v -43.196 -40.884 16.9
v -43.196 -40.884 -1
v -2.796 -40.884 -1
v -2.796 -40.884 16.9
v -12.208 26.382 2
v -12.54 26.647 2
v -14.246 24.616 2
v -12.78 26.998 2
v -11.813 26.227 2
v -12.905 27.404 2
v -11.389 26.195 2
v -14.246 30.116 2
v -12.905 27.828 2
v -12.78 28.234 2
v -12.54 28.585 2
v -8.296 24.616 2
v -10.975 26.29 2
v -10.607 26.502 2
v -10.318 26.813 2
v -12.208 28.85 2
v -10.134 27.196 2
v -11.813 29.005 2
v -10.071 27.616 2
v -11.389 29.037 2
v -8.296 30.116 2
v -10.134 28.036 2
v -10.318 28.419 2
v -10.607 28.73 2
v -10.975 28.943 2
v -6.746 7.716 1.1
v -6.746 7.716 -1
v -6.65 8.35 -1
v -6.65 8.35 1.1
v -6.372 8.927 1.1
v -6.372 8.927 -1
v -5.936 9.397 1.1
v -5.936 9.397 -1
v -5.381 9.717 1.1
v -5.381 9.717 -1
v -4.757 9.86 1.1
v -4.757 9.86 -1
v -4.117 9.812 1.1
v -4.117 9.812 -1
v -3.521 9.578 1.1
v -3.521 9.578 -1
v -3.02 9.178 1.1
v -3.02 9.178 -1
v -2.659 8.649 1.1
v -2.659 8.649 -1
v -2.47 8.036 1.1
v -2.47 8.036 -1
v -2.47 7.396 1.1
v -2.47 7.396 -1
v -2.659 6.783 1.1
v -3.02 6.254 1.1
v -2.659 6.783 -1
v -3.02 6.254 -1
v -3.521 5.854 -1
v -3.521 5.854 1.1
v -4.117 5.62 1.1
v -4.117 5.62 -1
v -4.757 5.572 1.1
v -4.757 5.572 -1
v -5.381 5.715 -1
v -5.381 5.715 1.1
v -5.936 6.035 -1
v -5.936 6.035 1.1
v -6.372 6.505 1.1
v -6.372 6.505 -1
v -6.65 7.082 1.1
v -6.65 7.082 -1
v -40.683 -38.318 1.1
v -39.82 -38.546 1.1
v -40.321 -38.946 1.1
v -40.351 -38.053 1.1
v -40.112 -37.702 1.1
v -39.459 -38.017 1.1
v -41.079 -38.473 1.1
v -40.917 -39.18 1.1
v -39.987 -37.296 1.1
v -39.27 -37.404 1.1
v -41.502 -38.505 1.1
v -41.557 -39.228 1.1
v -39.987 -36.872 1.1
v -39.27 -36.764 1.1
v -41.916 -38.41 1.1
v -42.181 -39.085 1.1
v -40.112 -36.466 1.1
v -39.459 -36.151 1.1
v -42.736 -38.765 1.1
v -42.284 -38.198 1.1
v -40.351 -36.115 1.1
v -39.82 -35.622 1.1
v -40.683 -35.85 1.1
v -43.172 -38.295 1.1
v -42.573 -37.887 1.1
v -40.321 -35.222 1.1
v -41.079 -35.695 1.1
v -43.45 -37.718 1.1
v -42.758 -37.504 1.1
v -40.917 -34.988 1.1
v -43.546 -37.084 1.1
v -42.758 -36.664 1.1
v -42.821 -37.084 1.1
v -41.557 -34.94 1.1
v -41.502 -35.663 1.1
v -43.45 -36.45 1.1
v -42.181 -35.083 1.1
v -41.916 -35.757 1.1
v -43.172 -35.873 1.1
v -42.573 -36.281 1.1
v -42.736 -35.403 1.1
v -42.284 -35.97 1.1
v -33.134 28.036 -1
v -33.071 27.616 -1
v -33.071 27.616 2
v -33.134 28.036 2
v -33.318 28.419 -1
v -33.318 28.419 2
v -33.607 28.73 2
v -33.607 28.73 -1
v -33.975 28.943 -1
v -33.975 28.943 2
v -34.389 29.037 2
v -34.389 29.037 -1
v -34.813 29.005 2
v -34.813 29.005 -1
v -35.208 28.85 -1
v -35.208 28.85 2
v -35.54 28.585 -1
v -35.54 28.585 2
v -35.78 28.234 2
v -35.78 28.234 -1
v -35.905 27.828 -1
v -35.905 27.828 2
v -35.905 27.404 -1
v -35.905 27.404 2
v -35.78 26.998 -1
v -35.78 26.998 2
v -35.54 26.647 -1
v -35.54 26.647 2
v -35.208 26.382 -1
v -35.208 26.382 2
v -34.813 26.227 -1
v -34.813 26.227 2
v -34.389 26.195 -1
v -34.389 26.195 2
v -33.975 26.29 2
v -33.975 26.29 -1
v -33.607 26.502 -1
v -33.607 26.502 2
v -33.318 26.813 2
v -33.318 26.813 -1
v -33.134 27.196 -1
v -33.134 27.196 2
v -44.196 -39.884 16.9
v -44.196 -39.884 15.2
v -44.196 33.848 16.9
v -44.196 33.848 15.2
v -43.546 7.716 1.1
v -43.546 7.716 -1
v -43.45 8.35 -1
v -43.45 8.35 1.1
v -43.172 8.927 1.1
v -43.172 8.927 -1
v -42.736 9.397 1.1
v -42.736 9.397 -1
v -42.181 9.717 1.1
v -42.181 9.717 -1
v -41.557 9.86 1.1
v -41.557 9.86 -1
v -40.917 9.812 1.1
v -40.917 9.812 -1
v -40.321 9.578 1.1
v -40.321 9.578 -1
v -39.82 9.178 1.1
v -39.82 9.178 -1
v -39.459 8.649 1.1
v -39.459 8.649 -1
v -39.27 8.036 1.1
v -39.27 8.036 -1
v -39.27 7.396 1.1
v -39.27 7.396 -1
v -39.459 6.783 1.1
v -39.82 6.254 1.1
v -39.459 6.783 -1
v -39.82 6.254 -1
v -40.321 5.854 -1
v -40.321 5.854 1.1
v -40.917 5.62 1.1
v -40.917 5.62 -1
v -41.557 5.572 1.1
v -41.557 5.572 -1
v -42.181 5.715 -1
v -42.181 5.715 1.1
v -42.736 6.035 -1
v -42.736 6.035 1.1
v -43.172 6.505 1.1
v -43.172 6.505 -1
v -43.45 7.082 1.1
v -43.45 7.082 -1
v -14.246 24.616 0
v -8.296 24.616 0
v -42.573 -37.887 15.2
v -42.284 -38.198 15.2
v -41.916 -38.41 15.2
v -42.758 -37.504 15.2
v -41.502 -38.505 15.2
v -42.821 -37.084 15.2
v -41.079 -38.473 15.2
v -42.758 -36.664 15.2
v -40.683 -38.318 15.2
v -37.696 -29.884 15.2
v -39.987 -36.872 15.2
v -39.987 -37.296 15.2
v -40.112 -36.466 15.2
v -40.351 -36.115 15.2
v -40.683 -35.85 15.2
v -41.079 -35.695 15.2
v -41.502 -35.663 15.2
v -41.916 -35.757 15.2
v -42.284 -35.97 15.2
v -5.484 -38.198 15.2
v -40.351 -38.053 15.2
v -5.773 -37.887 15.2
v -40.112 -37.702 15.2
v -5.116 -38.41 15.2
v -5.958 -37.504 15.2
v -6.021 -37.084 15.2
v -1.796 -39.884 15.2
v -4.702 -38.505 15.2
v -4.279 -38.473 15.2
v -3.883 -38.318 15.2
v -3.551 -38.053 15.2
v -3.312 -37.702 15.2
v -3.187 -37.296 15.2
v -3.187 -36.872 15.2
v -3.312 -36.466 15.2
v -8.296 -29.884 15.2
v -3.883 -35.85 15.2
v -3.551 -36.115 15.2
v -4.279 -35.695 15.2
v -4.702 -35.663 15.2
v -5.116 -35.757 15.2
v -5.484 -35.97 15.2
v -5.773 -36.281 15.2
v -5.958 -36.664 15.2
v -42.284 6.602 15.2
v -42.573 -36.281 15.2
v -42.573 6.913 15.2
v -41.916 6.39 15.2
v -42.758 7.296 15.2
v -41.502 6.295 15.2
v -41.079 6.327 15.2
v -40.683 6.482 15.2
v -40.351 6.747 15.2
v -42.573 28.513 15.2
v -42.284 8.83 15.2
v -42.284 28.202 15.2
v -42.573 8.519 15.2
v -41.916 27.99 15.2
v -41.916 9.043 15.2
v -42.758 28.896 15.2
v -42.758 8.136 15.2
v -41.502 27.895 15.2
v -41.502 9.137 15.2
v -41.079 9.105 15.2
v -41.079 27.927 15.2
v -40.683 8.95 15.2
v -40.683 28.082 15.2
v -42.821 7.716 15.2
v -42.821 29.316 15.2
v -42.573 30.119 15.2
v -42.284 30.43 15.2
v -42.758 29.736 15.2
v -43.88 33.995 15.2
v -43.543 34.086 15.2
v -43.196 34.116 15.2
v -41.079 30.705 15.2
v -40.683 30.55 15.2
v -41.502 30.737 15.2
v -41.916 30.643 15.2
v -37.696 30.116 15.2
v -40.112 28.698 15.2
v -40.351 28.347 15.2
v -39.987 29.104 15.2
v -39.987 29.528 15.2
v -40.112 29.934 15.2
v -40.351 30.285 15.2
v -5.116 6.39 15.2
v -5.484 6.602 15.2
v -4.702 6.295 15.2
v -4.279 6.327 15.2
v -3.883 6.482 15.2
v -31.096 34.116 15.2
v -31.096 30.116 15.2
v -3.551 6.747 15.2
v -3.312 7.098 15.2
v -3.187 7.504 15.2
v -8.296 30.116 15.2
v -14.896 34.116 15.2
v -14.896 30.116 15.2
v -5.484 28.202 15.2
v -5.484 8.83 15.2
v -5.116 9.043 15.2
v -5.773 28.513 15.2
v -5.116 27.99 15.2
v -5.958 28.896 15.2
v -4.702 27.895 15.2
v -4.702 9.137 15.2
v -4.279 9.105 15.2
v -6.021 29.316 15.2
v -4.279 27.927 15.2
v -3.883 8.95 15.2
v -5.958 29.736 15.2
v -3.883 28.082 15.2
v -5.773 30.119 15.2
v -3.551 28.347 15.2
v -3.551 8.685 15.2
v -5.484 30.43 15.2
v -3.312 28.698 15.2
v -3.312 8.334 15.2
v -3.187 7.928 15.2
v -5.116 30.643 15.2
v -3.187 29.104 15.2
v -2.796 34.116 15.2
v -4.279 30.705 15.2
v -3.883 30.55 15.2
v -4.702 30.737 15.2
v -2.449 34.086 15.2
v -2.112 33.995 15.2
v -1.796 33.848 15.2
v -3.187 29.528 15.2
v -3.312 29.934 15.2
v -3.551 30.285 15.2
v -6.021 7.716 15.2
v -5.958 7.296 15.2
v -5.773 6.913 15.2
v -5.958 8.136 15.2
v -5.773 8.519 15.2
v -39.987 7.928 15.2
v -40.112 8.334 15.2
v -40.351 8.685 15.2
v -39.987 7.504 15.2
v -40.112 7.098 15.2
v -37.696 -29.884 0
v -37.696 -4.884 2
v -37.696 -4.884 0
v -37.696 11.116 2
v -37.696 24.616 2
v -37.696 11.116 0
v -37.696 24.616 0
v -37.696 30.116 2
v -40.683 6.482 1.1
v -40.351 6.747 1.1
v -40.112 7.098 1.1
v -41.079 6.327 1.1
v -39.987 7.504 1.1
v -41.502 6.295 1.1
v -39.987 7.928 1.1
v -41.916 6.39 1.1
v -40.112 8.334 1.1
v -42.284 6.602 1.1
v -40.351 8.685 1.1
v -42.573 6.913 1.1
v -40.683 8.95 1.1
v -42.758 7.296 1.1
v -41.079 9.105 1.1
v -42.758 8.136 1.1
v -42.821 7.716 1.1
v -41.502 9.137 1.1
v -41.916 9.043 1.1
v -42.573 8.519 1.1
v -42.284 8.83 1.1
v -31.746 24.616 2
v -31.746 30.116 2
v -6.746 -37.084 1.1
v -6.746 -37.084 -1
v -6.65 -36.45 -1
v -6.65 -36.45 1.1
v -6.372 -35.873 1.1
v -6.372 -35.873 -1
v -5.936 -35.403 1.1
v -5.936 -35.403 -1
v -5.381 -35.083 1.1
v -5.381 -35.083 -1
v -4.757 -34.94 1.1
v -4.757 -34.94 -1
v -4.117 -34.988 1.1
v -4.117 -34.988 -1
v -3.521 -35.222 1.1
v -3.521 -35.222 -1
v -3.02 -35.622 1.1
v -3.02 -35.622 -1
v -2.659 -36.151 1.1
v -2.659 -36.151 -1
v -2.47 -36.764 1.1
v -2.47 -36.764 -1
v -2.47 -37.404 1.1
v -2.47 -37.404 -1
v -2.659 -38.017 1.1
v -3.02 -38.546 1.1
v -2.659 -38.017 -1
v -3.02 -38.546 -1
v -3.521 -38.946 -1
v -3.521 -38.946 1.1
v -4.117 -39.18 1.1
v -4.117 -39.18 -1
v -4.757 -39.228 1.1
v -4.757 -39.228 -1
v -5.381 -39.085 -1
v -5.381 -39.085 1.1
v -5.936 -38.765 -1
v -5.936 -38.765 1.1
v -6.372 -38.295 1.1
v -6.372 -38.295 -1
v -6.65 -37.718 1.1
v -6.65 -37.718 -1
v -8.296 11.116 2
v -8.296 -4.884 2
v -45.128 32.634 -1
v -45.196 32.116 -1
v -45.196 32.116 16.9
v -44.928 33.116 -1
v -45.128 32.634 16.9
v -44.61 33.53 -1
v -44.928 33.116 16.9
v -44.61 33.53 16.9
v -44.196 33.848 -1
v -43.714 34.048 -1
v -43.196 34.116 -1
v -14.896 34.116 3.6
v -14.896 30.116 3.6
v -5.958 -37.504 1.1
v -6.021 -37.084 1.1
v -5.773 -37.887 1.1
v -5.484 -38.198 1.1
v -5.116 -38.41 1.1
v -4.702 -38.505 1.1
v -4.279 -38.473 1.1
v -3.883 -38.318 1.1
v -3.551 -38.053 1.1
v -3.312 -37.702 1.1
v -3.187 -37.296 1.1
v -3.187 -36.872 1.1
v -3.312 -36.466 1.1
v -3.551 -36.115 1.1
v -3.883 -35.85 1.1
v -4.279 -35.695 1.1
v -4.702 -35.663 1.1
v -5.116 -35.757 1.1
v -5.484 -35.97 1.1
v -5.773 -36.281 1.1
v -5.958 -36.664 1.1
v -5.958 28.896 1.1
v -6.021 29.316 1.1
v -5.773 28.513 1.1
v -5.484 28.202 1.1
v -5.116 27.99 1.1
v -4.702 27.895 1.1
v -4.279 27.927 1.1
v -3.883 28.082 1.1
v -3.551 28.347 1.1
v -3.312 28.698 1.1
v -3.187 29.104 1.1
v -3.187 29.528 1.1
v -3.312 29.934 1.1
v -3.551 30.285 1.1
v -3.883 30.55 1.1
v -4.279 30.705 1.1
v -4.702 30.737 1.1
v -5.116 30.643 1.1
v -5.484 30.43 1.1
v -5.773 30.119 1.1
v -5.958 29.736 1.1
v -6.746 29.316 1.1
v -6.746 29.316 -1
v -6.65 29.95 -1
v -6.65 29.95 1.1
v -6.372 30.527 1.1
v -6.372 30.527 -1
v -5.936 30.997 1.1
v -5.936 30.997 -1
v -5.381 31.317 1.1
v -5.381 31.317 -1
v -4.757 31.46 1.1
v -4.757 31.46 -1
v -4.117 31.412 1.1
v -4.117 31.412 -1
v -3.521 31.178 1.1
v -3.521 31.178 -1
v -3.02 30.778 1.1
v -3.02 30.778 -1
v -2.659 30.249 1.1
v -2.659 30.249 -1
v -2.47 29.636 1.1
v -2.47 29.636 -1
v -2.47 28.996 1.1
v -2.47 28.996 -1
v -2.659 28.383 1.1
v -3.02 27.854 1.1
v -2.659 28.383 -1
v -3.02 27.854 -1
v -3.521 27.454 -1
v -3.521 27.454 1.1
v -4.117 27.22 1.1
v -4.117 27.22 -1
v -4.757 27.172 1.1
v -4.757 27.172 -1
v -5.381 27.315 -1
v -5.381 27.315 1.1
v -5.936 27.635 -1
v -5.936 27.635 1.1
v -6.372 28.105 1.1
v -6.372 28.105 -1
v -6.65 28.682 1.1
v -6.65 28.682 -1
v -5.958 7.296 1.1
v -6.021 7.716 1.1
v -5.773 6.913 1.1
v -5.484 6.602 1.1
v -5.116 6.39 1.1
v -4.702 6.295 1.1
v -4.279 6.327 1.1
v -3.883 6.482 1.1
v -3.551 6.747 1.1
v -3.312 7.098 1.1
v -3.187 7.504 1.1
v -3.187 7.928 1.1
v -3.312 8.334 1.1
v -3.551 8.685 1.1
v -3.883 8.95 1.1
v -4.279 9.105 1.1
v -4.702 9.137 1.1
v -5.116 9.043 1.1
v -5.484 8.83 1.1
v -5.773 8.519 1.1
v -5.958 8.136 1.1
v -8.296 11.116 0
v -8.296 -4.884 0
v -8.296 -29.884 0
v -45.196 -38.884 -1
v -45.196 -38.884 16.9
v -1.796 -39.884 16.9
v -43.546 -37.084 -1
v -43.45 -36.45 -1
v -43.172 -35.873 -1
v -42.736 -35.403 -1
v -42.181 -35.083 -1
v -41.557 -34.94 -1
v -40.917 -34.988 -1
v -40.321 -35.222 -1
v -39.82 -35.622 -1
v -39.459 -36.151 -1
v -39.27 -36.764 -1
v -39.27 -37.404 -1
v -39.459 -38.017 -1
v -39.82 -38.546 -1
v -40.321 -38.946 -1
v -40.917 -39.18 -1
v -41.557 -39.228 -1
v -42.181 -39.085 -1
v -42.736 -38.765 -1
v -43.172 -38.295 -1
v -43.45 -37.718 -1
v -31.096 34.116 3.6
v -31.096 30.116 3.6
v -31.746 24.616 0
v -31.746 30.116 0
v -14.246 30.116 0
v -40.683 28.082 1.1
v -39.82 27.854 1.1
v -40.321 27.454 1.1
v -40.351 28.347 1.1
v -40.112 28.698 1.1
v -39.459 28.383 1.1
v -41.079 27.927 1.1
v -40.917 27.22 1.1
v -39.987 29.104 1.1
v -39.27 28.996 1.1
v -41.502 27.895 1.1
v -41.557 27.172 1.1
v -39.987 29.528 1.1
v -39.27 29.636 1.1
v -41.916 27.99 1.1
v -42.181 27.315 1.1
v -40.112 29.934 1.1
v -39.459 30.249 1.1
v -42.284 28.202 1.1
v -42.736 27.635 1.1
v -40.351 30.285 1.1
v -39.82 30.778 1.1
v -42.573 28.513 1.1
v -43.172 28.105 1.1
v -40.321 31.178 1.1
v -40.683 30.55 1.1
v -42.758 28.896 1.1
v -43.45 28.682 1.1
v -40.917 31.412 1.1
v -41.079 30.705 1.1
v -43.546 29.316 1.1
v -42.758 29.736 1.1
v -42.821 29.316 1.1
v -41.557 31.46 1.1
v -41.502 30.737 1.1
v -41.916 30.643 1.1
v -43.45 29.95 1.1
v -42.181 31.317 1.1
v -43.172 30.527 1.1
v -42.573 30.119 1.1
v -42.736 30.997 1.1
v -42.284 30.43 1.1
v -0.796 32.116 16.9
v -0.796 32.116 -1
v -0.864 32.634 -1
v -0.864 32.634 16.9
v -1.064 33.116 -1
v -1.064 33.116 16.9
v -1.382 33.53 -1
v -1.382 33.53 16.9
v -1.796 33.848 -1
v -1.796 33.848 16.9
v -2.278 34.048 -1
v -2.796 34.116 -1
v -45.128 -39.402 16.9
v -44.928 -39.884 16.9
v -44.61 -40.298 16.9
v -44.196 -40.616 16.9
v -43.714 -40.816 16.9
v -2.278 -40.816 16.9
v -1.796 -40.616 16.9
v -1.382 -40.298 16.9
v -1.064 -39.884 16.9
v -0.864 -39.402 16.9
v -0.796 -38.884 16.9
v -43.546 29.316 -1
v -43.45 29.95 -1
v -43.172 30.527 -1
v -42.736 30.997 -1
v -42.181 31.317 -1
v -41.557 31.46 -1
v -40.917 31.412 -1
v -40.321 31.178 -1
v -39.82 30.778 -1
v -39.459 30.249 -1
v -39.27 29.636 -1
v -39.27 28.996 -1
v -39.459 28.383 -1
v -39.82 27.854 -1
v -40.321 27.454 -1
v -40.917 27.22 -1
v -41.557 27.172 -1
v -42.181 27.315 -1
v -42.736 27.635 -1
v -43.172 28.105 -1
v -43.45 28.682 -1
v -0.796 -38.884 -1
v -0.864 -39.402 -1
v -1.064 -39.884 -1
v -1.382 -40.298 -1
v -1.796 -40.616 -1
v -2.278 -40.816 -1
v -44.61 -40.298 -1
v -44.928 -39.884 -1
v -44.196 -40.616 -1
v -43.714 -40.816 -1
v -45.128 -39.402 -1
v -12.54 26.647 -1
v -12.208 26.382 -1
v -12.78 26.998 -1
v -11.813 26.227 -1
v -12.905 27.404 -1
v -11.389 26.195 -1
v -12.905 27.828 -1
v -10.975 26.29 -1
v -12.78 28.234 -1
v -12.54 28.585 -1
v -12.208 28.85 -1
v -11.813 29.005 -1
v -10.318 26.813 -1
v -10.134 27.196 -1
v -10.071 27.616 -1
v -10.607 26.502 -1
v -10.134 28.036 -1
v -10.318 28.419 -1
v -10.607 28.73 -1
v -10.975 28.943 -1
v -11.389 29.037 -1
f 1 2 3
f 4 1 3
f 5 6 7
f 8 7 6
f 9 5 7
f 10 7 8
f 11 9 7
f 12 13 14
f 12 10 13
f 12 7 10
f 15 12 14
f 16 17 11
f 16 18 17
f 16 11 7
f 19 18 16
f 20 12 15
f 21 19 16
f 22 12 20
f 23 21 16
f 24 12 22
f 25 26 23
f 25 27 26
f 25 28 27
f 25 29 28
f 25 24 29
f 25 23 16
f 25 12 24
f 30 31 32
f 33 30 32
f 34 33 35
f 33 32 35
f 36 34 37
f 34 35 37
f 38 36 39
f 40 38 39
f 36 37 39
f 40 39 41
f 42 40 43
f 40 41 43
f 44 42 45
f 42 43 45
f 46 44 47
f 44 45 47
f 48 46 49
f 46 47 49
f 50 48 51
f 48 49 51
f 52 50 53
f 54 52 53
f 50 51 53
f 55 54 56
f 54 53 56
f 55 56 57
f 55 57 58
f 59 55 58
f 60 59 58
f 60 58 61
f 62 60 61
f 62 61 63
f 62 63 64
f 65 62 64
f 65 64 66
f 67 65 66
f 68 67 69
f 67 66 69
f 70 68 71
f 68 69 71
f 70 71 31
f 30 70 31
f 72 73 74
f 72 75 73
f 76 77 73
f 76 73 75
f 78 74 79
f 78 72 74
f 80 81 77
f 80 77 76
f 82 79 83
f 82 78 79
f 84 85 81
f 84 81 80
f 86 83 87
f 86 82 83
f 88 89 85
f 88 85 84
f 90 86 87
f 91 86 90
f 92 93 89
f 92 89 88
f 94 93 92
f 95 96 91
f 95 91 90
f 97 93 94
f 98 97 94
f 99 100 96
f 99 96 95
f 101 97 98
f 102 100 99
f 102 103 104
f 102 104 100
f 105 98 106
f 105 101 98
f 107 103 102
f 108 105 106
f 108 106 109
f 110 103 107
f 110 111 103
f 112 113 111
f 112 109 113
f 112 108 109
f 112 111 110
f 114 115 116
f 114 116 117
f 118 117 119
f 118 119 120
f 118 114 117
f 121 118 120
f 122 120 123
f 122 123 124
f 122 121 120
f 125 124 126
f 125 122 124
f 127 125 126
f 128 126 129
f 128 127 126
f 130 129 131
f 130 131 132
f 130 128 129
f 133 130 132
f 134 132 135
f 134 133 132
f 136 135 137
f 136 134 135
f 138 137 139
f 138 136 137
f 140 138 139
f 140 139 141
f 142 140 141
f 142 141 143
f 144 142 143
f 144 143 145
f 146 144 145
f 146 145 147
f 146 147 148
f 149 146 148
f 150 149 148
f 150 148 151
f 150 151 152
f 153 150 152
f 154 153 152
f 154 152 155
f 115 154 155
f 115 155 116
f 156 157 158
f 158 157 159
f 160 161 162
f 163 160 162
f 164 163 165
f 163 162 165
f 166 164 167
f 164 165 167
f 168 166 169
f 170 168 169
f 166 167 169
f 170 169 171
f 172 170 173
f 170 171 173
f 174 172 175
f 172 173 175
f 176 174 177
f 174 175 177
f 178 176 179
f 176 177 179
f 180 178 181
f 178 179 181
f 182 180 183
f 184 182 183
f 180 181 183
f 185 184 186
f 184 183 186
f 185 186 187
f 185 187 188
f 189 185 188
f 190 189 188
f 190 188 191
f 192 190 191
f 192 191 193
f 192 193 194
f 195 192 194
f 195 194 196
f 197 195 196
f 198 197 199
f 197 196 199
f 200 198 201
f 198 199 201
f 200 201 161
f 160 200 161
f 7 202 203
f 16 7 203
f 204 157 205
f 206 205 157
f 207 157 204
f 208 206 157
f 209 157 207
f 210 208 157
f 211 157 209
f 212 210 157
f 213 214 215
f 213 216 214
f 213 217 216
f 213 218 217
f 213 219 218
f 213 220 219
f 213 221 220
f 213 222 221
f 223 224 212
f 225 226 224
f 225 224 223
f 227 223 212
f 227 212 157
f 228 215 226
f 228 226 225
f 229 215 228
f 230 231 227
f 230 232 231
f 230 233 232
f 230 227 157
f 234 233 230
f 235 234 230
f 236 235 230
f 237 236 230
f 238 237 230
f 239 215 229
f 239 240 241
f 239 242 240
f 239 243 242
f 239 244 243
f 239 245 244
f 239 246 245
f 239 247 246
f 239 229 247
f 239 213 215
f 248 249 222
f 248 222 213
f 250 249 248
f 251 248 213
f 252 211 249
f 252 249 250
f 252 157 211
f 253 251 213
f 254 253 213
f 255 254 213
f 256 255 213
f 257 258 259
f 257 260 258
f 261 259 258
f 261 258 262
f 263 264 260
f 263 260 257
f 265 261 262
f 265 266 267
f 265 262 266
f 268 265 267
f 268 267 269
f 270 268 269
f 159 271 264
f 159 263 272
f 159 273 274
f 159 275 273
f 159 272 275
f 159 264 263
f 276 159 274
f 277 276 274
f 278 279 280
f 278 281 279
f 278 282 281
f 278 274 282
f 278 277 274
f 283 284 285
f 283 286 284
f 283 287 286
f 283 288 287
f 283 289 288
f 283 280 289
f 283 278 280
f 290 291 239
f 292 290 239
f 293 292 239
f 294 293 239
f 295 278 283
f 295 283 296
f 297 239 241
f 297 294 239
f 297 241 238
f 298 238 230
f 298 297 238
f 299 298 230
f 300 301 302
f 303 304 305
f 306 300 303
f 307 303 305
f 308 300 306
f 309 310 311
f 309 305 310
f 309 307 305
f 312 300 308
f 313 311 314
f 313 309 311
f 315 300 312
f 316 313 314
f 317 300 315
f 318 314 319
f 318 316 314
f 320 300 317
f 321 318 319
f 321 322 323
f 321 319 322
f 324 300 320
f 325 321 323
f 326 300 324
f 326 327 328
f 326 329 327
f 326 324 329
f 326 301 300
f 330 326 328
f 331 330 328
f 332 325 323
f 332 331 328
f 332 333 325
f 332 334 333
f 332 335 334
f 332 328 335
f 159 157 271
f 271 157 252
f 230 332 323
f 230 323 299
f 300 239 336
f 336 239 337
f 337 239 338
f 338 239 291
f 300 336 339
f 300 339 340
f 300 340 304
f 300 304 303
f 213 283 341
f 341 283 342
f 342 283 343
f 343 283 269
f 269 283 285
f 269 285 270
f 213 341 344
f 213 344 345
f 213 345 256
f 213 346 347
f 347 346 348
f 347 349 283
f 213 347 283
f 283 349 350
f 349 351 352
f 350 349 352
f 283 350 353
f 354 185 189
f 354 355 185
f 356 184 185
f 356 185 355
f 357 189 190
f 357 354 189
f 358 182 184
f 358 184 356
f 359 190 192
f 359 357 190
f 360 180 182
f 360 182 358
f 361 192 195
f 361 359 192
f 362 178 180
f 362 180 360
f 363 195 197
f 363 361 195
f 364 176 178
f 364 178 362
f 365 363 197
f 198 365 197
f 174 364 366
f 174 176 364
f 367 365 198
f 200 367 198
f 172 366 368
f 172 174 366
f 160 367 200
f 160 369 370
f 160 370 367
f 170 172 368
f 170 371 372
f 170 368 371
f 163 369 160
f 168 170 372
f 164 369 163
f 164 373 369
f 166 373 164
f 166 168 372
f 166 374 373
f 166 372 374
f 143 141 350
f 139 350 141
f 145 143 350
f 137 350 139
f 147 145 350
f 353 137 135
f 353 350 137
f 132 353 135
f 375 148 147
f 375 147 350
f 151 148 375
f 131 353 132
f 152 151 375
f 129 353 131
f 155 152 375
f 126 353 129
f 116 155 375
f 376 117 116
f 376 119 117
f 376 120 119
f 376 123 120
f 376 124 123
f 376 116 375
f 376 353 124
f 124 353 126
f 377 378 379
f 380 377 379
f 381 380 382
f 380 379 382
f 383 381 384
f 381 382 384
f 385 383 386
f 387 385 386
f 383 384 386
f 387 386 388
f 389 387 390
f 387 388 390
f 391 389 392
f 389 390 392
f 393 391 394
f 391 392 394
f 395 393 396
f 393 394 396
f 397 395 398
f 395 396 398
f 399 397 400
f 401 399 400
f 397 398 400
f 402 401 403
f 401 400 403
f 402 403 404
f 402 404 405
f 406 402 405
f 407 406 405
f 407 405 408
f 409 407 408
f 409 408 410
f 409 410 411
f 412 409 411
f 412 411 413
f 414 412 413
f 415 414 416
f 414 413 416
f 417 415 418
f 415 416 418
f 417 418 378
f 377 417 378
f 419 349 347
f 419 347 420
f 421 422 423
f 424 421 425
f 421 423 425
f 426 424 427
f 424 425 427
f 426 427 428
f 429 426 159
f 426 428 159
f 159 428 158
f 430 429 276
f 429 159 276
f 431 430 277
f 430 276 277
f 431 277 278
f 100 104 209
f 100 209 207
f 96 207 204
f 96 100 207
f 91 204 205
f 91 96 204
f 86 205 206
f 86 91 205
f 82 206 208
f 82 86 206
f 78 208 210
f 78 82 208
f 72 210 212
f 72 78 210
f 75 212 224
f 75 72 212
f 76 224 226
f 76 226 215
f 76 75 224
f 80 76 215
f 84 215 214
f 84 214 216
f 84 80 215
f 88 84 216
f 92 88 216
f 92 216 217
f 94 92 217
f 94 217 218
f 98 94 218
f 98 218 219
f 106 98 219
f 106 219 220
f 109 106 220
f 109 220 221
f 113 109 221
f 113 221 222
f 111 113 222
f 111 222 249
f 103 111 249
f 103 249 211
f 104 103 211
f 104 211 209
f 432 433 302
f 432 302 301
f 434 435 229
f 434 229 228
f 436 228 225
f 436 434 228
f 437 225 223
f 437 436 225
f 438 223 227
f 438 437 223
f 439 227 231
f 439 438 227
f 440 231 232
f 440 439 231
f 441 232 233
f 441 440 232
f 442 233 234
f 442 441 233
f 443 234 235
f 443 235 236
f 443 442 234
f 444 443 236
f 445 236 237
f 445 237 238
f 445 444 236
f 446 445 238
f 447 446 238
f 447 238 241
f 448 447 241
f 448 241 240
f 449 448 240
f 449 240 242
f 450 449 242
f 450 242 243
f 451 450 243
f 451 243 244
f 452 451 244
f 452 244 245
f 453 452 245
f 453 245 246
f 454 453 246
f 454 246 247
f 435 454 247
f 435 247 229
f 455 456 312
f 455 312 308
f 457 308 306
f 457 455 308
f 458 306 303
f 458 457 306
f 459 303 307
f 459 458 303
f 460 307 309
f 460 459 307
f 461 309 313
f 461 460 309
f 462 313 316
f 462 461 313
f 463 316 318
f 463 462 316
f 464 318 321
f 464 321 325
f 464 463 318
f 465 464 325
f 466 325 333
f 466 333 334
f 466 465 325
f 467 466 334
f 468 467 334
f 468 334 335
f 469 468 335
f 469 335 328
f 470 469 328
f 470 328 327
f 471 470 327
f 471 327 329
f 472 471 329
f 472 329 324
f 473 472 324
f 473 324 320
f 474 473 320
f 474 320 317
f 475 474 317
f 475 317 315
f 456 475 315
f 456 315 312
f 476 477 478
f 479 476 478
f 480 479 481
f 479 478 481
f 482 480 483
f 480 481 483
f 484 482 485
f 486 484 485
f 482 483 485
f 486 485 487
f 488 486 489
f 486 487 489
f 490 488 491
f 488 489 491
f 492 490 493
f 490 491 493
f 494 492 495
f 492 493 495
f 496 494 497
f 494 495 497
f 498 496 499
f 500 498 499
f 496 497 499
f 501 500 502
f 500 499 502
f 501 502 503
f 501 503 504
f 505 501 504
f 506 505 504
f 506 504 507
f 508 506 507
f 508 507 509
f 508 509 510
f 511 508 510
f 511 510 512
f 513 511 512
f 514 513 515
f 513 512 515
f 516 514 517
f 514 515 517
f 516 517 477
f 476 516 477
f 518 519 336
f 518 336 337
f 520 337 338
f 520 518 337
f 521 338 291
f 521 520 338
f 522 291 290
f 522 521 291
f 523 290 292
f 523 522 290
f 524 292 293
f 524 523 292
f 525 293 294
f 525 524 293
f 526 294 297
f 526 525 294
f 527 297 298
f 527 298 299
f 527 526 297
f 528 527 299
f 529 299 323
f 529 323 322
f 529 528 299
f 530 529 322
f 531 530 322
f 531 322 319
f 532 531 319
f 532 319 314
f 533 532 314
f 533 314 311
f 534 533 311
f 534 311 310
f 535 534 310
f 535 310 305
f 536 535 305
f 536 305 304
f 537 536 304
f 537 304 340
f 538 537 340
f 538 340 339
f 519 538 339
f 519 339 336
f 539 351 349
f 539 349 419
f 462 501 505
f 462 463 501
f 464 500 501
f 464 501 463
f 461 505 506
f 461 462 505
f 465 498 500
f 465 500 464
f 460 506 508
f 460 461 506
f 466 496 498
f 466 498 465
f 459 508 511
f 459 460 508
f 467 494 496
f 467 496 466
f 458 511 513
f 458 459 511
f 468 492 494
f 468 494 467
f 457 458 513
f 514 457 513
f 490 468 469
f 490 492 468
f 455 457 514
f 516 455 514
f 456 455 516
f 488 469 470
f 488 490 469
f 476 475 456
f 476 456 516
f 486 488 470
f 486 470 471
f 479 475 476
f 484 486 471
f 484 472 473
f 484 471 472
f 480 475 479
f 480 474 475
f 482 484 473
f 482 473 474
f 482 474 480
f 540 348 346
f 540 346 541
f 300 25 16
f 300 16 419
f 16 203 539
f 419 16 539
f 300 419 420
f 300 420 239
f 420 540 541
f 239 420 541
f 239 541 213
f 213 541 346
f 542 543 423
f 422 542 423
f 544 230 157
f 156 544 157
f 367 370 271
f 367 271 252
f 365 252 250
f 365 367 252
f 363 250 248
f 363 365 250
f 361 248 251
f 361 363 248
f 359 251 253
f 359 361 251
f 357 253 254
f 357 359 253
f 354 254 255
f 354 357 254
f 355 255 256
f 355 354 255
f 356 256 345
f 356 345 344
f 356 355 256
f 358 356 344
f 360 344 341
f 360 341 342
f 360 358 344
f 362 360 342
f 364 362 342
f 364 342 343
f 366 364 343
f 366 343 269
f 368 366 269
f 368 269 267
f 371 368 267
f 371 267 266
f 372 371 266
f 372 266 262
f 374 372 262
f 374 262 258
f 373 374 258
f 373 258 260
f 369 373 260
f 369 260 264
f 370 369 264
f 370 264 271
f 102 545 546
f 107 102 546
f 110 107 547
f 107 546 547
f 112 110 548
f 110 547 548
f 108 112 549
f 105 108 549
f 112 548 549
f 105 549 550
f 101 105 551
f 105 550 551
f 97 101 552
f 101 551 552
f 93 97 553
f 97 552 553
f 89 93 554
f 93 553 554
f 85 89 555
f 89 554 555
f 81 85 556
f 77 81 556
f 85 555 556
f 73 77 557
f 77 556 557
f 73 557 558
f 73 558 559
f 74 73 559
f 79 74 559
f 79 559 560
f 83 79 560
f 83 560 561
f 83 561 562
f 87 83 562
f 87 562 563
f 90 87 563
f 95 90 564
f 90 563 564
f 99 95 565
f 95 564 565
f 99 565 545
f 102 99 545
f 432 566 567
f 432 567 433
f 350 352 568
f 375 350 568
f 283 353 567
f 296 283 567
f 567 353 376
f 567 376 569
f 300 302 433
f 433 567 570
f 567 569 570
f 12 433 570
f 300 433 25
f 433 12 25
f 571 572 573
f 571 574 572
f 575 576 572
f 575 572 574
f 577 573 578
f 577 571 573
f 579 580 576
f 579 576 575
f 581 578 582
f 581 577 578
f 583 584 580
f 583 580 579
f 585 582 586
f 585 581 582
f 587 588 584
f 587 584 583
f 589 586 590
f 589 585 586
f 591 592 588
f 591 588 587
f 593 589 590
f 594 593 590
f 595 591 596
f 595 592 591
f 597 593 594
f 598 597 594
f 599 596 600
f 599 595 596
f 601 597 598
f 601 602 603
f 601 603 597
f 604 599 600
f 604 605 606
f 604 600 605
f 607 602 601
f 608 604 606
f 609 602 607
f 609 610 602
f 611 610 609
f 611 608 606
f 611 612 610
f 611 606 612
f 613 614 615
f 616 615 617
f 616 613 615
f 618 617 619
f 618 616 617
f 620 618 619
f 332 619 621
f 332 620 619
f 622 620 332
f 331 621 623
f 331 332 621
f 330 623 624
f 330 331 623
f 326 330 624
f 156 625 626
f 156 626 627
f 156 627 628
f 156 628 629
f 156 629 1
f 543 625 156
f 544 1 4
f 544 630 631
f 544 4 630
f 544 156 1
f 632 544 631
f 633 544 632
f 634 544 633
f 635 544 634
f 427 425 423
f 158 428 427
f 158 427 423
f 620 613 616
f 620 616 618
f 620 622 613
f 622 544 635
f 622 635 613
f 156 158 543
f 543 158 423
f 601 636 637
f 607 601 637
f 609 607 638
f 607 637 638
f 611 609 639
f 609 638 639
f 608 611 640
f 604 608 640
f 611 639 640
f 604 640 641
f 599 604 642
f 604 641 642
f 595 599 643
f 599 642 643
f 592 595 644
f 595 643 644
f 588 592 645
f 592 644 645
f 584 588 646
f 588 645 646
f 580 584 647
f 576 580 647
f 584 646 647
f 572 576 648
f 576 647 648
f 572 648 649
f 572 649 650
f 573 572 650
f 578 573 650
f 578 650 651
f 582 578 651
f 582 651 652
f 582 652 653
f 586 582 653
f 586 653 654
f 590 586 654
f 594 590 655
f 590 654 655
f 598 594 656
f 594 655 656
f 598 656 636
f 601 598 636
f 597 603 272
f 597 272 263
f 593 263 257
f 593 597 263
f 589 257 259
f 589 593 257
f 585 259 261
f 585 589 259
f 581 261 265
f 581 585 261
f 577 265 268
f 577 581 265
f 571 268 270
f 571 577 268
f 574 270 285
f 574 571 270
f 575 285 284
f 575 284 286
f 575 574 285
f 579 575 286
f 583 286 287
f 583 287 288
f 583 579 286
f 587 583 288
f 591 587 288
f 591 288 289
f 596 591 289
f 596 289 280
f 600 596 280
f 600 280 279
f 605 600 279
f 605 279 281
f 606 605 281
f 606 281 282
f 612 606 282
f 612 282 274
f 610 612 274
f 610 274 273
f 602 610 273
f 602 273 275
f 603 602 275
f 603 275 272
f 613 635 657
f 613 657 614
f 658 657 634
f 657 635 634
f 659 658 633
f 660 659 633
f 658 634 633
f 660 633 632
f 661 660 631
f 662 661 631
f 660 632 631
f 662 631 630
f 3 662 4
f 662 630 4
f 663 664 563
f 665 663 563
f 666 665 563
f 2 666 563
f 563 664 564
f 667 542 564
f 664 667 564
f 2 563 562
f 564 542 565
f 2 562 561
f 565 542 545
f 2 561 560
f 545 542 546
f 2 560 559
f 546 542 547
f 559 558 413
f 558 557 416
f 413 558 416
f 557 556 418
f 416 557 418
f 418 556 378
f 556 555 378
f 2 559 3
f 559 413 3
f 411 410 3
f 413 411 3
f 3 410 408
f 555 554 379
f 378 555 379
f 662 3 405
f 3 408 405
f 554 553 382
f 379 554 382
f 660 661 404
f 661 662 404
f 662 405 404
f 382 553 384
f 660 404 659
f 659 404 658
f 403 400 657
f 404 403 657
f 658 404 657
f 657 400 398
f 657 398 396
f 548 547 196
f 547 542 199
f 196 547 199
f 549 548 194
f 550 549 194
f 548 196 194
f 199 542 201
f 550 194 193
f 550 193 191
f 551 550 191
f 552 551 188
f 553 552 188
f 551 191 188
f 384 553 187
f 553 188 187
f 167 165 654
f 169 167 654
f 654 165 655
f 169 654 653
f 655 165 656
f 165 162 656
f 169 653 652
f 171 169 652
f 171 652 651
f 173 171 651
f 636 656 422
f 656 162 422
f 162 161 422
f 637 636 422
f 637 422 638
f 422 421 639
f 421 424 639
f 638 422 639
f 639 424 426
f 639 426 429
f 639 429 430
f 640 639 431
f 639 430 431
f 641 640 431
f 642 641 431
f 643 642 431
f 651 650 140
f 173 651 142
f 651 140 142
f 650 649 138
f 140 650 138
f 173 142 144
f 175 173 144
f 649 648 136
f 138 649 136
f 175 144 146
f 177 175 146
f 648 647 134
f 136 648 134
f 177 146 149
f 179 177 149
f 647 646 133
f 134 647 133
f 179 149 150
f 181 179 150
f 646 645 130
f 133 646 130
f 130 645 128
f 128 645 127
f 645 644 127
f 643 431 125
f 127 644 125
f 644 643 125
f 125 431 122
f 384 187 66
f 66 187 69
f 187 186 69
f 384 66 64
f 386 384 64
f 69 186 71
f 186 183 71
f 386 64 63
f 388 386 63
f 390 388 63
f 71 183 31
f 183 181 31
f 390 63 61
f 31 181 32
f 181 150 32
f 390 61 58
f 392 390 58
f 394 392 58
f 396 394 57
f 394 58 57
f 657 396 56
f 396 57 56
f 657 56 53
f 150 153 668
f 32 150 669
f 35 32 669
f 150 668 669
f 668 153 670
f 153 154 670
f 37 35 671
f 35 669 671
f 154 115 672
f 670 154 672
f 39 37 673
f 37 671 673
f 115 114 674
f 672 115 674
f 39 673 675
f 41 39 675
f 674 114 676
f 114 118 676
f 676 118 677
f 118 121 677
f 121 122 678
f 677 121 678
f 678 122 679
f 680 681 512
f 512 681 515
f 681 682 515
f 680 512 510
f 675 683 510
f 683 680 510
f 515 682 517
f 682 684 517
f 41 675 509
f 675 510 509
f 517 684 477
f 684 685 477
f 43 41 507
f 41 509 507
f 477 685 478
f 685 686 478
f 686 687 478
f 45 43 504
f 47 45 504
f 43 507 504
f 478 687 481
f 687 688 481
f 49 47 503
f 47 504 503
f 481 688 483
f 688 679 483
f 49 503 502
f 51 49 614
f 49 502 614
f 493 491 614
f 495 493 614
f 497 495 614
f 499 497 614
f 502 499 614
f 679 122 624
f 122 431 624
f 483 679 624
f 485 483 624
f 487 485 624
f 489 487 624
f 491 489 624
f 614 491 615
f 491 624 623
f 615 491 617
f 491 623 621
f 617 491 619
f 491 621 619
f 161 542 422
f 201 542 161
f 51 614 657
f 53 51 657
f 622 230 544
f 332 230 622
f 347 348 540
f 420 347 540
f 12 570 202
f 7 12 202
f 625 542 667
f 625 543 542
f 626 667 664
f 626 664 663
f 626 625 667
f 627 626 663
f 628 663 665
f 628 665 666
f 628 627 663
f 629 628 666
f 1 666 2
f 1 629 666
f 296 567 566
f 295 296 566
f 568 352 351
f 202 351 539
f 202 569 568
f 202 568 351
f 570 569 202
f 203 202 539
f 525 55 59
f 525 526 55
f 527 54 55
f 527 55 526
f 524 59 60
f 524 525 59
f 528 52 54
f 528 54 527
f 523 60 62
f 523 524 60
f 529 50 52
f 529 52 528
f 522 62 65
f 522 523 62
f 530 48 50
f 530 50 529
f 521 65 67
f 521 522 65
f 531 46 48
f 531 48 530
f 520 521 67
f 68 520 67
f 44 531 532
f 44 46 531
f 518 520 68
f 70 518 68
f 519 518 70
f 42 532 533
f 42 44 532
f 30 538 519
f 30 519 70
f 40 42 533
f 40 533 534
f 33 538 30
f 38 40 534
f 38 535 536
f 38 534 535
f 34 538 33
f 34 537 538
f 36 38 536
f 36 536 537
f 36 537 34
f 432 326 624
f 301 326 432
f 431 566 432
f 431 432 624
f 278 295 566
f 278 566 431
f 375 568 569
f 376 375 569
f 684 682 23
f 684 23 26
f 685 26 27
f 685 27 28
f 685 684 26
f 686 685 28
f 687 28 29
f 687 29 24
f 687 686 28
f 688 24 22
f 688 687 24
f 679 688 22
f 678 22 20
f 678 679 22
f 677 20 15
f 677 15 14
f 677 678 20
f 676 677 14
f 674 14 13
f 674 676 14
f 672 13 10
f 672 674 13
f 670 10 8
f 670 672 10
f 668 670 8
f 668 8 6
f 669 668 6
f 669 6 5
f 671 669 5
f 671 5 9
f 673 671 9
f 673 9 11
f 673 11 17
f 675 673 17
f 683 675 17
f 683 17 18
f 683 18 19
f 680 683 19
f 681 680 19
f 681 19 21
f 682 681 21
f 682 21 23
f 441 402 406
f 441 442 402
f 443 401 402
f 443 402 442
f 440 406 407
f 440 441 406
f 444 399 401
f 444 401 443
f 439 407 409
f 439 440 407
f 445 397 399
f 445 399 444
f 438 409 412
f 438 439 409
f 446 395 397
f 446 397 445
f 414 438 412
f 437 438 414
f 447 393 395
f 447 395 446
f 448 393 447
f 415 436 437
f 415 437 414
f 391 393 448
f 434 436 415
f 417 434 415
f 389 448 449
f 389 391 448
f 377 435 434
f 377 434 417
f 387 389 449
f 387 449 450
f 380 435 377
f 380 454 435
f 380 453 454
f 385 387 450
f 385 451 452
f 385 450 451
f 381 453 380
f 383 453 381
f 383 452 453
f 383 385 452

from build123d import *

# Parameters (mm, degrees)
SKETCH_2_R            = 1.425
EXTRUDE_1_DEPTH       = 2
SKETCH_2_3_R          = 1.425
EXTRUDE_2_DEPTH       = 2
EXTRUDE_START         = -1
EXTRUDE_3_DEPTH       = 1
EXTRUDE_4_DEPTH       = 1
SKETCH_2_6_W          = 8.1
SKETCH_2_6_H          = 3
EXTRUDE_5_DEPTH       = 3.6
EXTRUDE_6_DEPTH       = 15.2
EXTRUDE_6_DEPTH_BACK  = 1
SKETCH_2_7_R          = 1.425
SKETCH_2_8_W          = 29.4
SKETCH_2_8_H          = 25
EXTRUDE_7_DEPTH       = 1
SKETCH_2_9_W          = 29.4
SKETCH_2_9_H          = 16
EXTRUDE_8_DEPTH       = 1
SKETCH_2_10_W         = 29.4
SKETCH_2_10_H         = 16
EXTRUDE_9_DEPTH       = 2
SKETCH_2_11_W         = 8.1
SKETCH_2_11_H         = 3
SKETCH_2_11_R         = 1.425
EXTRUDE_10_DEPTH      = 1
EXTRUDE_12_DEPTH      = 16.9
EXTRUDE_12_DEPTH_BACK = 1
SKETCH_2_24_W         = 1
SKETCH_2_24_H         = 1
EXTRUDE_13_DEPTH      = 16.9
SKETCH_2_25_W         = 13.1
SKETCH_2_25_H         = 1
EXTRUDE_14_DEPTH      = 15.2
SKETCH_2_26_W         = 8.1
SKETCH_2_26_H         = 1
EXTRUDE_15_DEPTH      = 3.6
SKETCH_2_28_W         = 1
SKETCH_2_28_H         = 1
SKETCH_2_28_W_2       = 13.1
SKETCH_2_28_W_3       = 8.1
EXTRUDE_16_DEPTH      = 1
FILLET_1_R            = 2
SKETCH_4_R            = 2.15
SKETCH_4_R_2          = 1.425
CUT_EXTRUDE_1_DEPTH   = 2.1


# Read off the part's stored shape, not the designer's step: 凸台-拉伸3
with BuildPart() as part:
    # 草图2 → 凸台-拉伸1 (new body)
    with BuildSketch(Plane.XY):
        Polygon((-31.74588875, 30.116039863), (-37.24588875, 30.116039863), (-37.69588875, 30.116039863), (-37.69588875, 24.616039863), (-37.24588875, 24.616039863), (-31.74588875, 24.616039863), align=None)
        with Locations((-34.49588875, 27.616039863)):
            Circle(SKETCH_2_R, mode=Mode.SUBTRACT)
    extrude(amount=EXTRUDE_1_DEPTH)



with BuildPart() as body_2:
    # 草图2<3> → 凸台-拉伸2 (new body)
    with BuildSketch(Plane.XY):
        Polygon((-8.74588875, 30.116039863), (-14.24588875, 30.116039863), (-14.24588875, 24.616039863), (-8.74588875, 24.616039863), (-8.29588875, 24.616039863), (-8.29588875, 30.116039863), align=None)
        with Locations((-11.49588875, 27.616039863)):
            Circle(SKETCH_2_3_R, mode=Mode.SUBTRACT)
    extrude(amount=EXTRUDE_2_DEPTH)


with BuildPart() as body_3:
    # 凸台-拉伸3 outline → 凸台-拉伸3 (new body)
    with BuildSketch(Plane.XY.offset(EXTRUDE_START)):
        Polygon((-37.69588875, 24.616039863), (-37.69588875, 11.116039863), (-22.99588875, 11.116039863), (-22.99588875, 30.116039863), (-31.74588875, 30.116039863), (-31.74588875, 24.616039863), align=None)
    extrude(amount=EXTRUDE_3_DEPTH)

    # 草图2<5> → 凸台-拉伸4 (add)
    with BuildSketch(Plane.XY):
        Polygon((-22.99588875, 30.116039863), (-22.99588875, 28.589280798), (-22.99588875, 11.116039863), (-8.29588875, 11.116039863), (-8.29588875, 24.616039863), (-8.74588875, 24.616039863), (-14.24588875, 24.616039863), (-14.24588875, 30.116039863), (-14.89588875, 30.116039863), align=None)
    extrude(amount=-EXTRUDE_4_DEPTH)

    # 草图2<7> → 凸台-拉伸6 (add, two sides: drawn at the far end of the back side and taken through both)
    with BuildSketch(Plane.XY.offset(-EXTRUDE_6_DEPTH_BACK)):
        Polygon((-31.74588875, 30.116039863), (-31.09588875, 30.116039863), (-31.09588875, 33.116039863), (-44.19588875, 33.116039863), (-44.19588875, 11.116039863), (-44.19588875, -29.883960137), (-44.19588875, -39.883960137), (-1.79588875, -39.883960137), (-1.79588875, -29.883960137), (-1.79588875, 11.116039863), (-1.79588875, 33.116039863), (-14.89588875, 33.116039863), (-14.89588875, 30.116039863), (-14.24588875, 30.116039863), (-8.74588875, 30.116039863), (-8.29588875, 30.116039863), (-8.29588875, 24.616039863), (-8.29588875, 11.116039863), (-8.29588875, -4.883960137), (-8.29588875, -29.883960137), (-37.69588875, -29.883960137), (-37.69588875, -4.883960137), (-37.69588875, 11.116039863), (-37.69588875, 24.616039863), (-37.69588875, 30.116039863), (-37.24588875, 30.116039863), align=None)
        with Locations(Location((-41.39588875, -37.083960137, 0), (0, 0, 180))):
            Circle(SKETCH_2_7_R, mode=Mode.SUBTRACT)
        with Locations(Location((-4.59588875, -37.083960137, 0), (0, 0, 180))):
            Circle(SKETCH_2_7_R, mode=Mode.SUBTRACT)
        with Locations(Location((-41.39588875, 7.716039863, 0), (0, 0, 180))):
            Circle(SKETCH_2_7_R, mode=Mode.SUBTRACT)
        with Locations(Location((-41.39588875, 29.316039863, 0), (0, 0, 180))):
            Circle(SKETCH_2_7_R, mode=Mode.SUBTRACT)
        with Locations(Location((-4.59588875, 7.716039863, 0), (0, 0, 180))):
            Circle(SKETCH_2_7_R, mode=Mode.SUBTRACT)
        with Locations(Location((-4.59588875, 29.316039863, 0), (0, 0, 180))):
            Circle(SKETCH_2_7_R, mode=Mode.SUBTRACT)
    extrude(amount=EXTRUDE_6_DEPTH + EXTRUDE_6_DEPTH_BACK)

    # 草图2<8> → 凸台-拉伸7 (add)
    with BuildSketch(Plane.XY):
        with Locations((-22.99588875, -17.383960137)):
            Rectangle(SKETCH_2_8_W, SKETCH_2_8_H)
    extrude(amount=-EXTRUDE_7_DEPTH)

    # 草图2<9> → 凸台-拉伸8 (add)
    with BuildSketch(Plane.XY):
        with Locations((-22.99588875, 3.116039863)):
            Rectangle(SKETCH_2_9_W, SKETCH_2_9_H)
    extrude(amount=-EXTRUDE_8_DEPTH)

    # 草图2<10> → 凸台-拉伸9 (add)
    with BuildSketch(Plane.XY):
        with Locations((-22.99588875, 3.116039863)):
            Rectangle(SKETCH_2_10_W, SKETCH_2_10_H)
    extrude(amount=EXTRUDE_9_DEPTH)


with BuildPart() as body_4:
    # 草图2<6> → 凸台-拉伸5 (new body)
    with BuildSketch(Plane.XY):
        with Locations((-27.04588875, 31.616039863)):
            Rectangle(SKETCH_2_6_W, SKETCH_2_6_H)
        with Locations((-18.94588875, 31.616039863)):
            Rectangle(SKETCH_2_6_W, SKETCH_2_6_H)
    extrude(amount=EXTRUDE_5_DEPTH)


with BuildPart() as part_1:
    add(part.part)

    add(body_2.part)  # 凸台-拉伸10 merges body 2

    add(body_3.part)  # 凸台-拉伸10 merges body 3

    add(body_4.part)  # 凸台-拉伸10 merges body 4
    # 草图2<11> → 凸台-拉伸10 (add)
    # profile 1 of 4: a face of its own
    with BuildSketch(Plane.XY.offset(EXTRUDE_START)):
        with Locations((-18.94588875, 31.616039863)):
            Rectangle(SKETCH_2_11_W, SKETCH_2_11_H)
    # profile 2 of 4: a face of its own
    with BuildSketch(Plane.XY.offset(EXTRUDE_START)):
        with Locations((-27.04588875, 31.616039863)):
            Rectangle(SKETCH_2_11_W, SKETCH_2_11_H)
    # profile 3 of 4: a face of its own
    with BuildSketch(Plane.XY.offset(EXTRUDE_START)):
        Polygon((-8.74588875, 30.116039863), (-14.24588875, 30.116039863), (-14.24588875, 24.616039863), (-8.74588875, 24.616039863), (-8.29588875, 24.616039863), (-8.29588875, 30.116039863), align=None)
        with Locations((-11.49588875, 27.616039863)):
            Circle(SKETCH_2_11_R, mode=Mode.SUBTRACT)
    # profile 4 of 4: a face of its own
    with BuildSketch(Plane.XY.offset(EXTRUDE_START)):
        Polygon((-31.74588875, 24.616039863), (-31.74588875, 30.116039863), (-37.24588875, 30.116039863), (-37.69588875, 30.116039863), (-37.69588875, 24.616039863), (-37.24588875, 24.616039863), align=None)
        with Locations((-34.49588875, 27.616039863)):
            Circle(SKETCH_2_11_R, mode=Mode.SUBTRACT)
    extrude(amount=EXTRUDE_10_DEPTH)

    # 草图2<22> → 凸台-拉伸12 (add, two sides: drawn at the far end of the back side and taken through both)
    with BuildSketch(Plane.XY.offset(-EXTRUDE_12_DEPTH_BACK)):
        Polygon((-44.19588875, 11.116039863), (-44.19588875, 33.116039863), (-45.19588875, 33.116039863), (-45.19588875, -40.883960137), (-44.19588875, -40.883960137), (-0.79588875, -40.883960137), (-0.79588875, 33.116039863), (-1.79588875, 33.116039863), (-1.79588875, 11.116039863), (-1.79588875, -29.883960137), (-1.79588875, -39.883960137), (-44.19588875, -39.883960137), (-44.19588875, -29.883960137), align=None)
    extrude(amount=EXTRUDE_12_DEPTH + EXTRUDE_12_DEPTH_BACK)

    # 草图2<24> → 凸台-拉伸13 (add)
    with BuildSketch(Plane.XY):
        with Locations((-44.69588875, 33.616039863)):
            Rectangle(SKETCH_2_24_W, SKETCH_2_24_H)
        with Locations((-1.29588875, 33.616039863)):
            Rectangle(SKETCH_2_24_W, SKETCH_2_24_H)
    extrude(amount=EXTRUDE_13_DEPTH)

    # 草图2<25> → 凸台-拉伸14 (add)
    with BuildSketch(Plane.XY):
        with Locations((-37.64588875, 33.616039863)):
            Rectangle(SKETCH_2_25_W, SKETCH_2_25_H)
        with Locations((-8.34588875, 33.616039863)):
            Rectangle(SKETCH_2_25_W, SKETCH_2_25_H)
    extrude(amount=EXTRUDE_14_DEPTH)

    # 草图2<26> → 凸台-拉伸15 (add)
    with BuildSketch(Plane.XY):
        with Locations((-27.04588875, 33.616039863)):
            Rectangle(SKETCH_2_26_W, SKETCH_2_26_H)
        with Locations((-18.94588875, 33.616039863)):
            Rectangle(SKETCH_2_26_W, SKETCH_2_26_H)
    extrude(amount=EXTRUDE_15_DEPTH)

    # 草图2<28> → 凸台-拉伸16 (add)
    with BuildSketch(Plane.XY):
        with Locations((-1.29588875, 33.616039863)):
            Rectangle(SKETCH_2_28_W, SKETCH_2_28_H)
        with Locations((-8.34588875, 33.616039863)):
            Rectangle(SKETCH_2_28_W_2, SKETCH_2_28_H)
        with Locations((-18.94588875, 33.616039863)):
            Rectangle(SKETCH_2_28_W_3, SKETCH_2_28_H)
        with Locations((-27.04588875, 33.616039863)):
            Rectangle(SKETCH_2_28_W_3, SKETCH_2_28_H)
        with Locations((-37.64588875, 33.616039863)):
            Rectangle(SKETCH_2_28_W_2, SKETCH_2_28_H)
        with Locations((-44.69588875, 33.616039863)):
            Rectangle(SKETCH_2_28_W, SKETCH_2_28_H)
    extrude(amount=-EXTRUDE_16_DEPTH)

    # 圆角1
    fillet_1_edges = [part_1.edges().sort_by_distance(p)[0] for p in [
        (-0.79588875, -40.883960137, 7.95),
        (-45.19588875, -40.883960137, 7.95),
        (-0.79588875, 34.116039863, 7.95),
        (-45.19588875, 34.116039863, 7.95),
    ]]
    fillet(fillet_1_edges, radius=FILLET_1_R)

    # 草图4 → 切除-拉伸1 (cut)
    # profile 1 of 6: a face of its own
    with BuildSketch(Plane(origin=(0, 0, -1), x_dir=(-1, 0, 0), z_dir=(0, 0, -1))):
        with Locations((4.59588875, 7.716039863)):
            Circle(SKETCH_4_R)
        with Locations((4.59588875, 7.716039863)):
            Circle(SKETCH_4_R_2, mode=Mode.SUBTRACT)
    # profile 2 of 6: a face of its own
    with BuildSketch(Plane(origin=(0, 0, -1), x_dir=(-1, 0, 0), z_dir=(0, 0, -1))):
        with Locations((4.59588875, 29.316039863)):
            Circle(SKETCH_4_R)
        with Locations((4.59588875, 29.316039863)):
            Circle(SKETCH_4_R_2, mode=Mode.SUBTRACT)
    # profile 3 of 6: a face of its own
    with BuildSketch(Plane(origin=(0, 0, -1), x_dir=(-1, 0, 0), z_dir=(0, 0, -1))):
        with Locations((41.39588875, 29.316039863)):
            Circle(SKETCH_4_R)
        with Locations((41.39588875, 29.316039863)):
            Circle(SKETCH_4_R_2, mode=Mode.SUBTRACT)
    # profile 4 of 6: a face of its own
    with BuildSketch(Plane(origin=(0, 0, -1), x_dir=(-1, 0, 0), z_dir=(0, 0, -1))):
        with Locations((41.39588875, 7.716039863)):
            Circle(SKETCH_4_R)
        with Locations((41.39588875, 7.716039863)):
            Circle(SKETCH_4_R_2, mode=Mode.SUBTRACT)
    # profile 5 of 6: a face of its own
    with BuildSketch(Plane(origin=(0, 0, -1), x_dir=(-1, 0, 0), z_dir=(0, 0, -1))):
        with Locations((4.59588875, -37.083960137)):
            Circle(SKETCH_4_R)
        with Locations((4.59588875, -37.083960137)):
            Circle(SKETCH_4_R_2, mode=Mode.SUBTRACT)
    # profile 6 of 6: a face of its own
    with BuildSketch(Plane(origin=(0, 0, -1), x_dir=(-1, 0, 0), z_dir=(0, 0, -1))):
        with Locations((41.39588875, -37.083960137)):
            Circle(SKETCH_4_R)
        with Locations((41.39588875, -37.083960137)):
            Circle(SKETCH_4_R_2, mode=Mode.SUBTRACT)
    extrude(amount=-CUT_EXTRUDE_1_DEPTH, mode=Mode.SUBTRACT)


solid = part_1.part
